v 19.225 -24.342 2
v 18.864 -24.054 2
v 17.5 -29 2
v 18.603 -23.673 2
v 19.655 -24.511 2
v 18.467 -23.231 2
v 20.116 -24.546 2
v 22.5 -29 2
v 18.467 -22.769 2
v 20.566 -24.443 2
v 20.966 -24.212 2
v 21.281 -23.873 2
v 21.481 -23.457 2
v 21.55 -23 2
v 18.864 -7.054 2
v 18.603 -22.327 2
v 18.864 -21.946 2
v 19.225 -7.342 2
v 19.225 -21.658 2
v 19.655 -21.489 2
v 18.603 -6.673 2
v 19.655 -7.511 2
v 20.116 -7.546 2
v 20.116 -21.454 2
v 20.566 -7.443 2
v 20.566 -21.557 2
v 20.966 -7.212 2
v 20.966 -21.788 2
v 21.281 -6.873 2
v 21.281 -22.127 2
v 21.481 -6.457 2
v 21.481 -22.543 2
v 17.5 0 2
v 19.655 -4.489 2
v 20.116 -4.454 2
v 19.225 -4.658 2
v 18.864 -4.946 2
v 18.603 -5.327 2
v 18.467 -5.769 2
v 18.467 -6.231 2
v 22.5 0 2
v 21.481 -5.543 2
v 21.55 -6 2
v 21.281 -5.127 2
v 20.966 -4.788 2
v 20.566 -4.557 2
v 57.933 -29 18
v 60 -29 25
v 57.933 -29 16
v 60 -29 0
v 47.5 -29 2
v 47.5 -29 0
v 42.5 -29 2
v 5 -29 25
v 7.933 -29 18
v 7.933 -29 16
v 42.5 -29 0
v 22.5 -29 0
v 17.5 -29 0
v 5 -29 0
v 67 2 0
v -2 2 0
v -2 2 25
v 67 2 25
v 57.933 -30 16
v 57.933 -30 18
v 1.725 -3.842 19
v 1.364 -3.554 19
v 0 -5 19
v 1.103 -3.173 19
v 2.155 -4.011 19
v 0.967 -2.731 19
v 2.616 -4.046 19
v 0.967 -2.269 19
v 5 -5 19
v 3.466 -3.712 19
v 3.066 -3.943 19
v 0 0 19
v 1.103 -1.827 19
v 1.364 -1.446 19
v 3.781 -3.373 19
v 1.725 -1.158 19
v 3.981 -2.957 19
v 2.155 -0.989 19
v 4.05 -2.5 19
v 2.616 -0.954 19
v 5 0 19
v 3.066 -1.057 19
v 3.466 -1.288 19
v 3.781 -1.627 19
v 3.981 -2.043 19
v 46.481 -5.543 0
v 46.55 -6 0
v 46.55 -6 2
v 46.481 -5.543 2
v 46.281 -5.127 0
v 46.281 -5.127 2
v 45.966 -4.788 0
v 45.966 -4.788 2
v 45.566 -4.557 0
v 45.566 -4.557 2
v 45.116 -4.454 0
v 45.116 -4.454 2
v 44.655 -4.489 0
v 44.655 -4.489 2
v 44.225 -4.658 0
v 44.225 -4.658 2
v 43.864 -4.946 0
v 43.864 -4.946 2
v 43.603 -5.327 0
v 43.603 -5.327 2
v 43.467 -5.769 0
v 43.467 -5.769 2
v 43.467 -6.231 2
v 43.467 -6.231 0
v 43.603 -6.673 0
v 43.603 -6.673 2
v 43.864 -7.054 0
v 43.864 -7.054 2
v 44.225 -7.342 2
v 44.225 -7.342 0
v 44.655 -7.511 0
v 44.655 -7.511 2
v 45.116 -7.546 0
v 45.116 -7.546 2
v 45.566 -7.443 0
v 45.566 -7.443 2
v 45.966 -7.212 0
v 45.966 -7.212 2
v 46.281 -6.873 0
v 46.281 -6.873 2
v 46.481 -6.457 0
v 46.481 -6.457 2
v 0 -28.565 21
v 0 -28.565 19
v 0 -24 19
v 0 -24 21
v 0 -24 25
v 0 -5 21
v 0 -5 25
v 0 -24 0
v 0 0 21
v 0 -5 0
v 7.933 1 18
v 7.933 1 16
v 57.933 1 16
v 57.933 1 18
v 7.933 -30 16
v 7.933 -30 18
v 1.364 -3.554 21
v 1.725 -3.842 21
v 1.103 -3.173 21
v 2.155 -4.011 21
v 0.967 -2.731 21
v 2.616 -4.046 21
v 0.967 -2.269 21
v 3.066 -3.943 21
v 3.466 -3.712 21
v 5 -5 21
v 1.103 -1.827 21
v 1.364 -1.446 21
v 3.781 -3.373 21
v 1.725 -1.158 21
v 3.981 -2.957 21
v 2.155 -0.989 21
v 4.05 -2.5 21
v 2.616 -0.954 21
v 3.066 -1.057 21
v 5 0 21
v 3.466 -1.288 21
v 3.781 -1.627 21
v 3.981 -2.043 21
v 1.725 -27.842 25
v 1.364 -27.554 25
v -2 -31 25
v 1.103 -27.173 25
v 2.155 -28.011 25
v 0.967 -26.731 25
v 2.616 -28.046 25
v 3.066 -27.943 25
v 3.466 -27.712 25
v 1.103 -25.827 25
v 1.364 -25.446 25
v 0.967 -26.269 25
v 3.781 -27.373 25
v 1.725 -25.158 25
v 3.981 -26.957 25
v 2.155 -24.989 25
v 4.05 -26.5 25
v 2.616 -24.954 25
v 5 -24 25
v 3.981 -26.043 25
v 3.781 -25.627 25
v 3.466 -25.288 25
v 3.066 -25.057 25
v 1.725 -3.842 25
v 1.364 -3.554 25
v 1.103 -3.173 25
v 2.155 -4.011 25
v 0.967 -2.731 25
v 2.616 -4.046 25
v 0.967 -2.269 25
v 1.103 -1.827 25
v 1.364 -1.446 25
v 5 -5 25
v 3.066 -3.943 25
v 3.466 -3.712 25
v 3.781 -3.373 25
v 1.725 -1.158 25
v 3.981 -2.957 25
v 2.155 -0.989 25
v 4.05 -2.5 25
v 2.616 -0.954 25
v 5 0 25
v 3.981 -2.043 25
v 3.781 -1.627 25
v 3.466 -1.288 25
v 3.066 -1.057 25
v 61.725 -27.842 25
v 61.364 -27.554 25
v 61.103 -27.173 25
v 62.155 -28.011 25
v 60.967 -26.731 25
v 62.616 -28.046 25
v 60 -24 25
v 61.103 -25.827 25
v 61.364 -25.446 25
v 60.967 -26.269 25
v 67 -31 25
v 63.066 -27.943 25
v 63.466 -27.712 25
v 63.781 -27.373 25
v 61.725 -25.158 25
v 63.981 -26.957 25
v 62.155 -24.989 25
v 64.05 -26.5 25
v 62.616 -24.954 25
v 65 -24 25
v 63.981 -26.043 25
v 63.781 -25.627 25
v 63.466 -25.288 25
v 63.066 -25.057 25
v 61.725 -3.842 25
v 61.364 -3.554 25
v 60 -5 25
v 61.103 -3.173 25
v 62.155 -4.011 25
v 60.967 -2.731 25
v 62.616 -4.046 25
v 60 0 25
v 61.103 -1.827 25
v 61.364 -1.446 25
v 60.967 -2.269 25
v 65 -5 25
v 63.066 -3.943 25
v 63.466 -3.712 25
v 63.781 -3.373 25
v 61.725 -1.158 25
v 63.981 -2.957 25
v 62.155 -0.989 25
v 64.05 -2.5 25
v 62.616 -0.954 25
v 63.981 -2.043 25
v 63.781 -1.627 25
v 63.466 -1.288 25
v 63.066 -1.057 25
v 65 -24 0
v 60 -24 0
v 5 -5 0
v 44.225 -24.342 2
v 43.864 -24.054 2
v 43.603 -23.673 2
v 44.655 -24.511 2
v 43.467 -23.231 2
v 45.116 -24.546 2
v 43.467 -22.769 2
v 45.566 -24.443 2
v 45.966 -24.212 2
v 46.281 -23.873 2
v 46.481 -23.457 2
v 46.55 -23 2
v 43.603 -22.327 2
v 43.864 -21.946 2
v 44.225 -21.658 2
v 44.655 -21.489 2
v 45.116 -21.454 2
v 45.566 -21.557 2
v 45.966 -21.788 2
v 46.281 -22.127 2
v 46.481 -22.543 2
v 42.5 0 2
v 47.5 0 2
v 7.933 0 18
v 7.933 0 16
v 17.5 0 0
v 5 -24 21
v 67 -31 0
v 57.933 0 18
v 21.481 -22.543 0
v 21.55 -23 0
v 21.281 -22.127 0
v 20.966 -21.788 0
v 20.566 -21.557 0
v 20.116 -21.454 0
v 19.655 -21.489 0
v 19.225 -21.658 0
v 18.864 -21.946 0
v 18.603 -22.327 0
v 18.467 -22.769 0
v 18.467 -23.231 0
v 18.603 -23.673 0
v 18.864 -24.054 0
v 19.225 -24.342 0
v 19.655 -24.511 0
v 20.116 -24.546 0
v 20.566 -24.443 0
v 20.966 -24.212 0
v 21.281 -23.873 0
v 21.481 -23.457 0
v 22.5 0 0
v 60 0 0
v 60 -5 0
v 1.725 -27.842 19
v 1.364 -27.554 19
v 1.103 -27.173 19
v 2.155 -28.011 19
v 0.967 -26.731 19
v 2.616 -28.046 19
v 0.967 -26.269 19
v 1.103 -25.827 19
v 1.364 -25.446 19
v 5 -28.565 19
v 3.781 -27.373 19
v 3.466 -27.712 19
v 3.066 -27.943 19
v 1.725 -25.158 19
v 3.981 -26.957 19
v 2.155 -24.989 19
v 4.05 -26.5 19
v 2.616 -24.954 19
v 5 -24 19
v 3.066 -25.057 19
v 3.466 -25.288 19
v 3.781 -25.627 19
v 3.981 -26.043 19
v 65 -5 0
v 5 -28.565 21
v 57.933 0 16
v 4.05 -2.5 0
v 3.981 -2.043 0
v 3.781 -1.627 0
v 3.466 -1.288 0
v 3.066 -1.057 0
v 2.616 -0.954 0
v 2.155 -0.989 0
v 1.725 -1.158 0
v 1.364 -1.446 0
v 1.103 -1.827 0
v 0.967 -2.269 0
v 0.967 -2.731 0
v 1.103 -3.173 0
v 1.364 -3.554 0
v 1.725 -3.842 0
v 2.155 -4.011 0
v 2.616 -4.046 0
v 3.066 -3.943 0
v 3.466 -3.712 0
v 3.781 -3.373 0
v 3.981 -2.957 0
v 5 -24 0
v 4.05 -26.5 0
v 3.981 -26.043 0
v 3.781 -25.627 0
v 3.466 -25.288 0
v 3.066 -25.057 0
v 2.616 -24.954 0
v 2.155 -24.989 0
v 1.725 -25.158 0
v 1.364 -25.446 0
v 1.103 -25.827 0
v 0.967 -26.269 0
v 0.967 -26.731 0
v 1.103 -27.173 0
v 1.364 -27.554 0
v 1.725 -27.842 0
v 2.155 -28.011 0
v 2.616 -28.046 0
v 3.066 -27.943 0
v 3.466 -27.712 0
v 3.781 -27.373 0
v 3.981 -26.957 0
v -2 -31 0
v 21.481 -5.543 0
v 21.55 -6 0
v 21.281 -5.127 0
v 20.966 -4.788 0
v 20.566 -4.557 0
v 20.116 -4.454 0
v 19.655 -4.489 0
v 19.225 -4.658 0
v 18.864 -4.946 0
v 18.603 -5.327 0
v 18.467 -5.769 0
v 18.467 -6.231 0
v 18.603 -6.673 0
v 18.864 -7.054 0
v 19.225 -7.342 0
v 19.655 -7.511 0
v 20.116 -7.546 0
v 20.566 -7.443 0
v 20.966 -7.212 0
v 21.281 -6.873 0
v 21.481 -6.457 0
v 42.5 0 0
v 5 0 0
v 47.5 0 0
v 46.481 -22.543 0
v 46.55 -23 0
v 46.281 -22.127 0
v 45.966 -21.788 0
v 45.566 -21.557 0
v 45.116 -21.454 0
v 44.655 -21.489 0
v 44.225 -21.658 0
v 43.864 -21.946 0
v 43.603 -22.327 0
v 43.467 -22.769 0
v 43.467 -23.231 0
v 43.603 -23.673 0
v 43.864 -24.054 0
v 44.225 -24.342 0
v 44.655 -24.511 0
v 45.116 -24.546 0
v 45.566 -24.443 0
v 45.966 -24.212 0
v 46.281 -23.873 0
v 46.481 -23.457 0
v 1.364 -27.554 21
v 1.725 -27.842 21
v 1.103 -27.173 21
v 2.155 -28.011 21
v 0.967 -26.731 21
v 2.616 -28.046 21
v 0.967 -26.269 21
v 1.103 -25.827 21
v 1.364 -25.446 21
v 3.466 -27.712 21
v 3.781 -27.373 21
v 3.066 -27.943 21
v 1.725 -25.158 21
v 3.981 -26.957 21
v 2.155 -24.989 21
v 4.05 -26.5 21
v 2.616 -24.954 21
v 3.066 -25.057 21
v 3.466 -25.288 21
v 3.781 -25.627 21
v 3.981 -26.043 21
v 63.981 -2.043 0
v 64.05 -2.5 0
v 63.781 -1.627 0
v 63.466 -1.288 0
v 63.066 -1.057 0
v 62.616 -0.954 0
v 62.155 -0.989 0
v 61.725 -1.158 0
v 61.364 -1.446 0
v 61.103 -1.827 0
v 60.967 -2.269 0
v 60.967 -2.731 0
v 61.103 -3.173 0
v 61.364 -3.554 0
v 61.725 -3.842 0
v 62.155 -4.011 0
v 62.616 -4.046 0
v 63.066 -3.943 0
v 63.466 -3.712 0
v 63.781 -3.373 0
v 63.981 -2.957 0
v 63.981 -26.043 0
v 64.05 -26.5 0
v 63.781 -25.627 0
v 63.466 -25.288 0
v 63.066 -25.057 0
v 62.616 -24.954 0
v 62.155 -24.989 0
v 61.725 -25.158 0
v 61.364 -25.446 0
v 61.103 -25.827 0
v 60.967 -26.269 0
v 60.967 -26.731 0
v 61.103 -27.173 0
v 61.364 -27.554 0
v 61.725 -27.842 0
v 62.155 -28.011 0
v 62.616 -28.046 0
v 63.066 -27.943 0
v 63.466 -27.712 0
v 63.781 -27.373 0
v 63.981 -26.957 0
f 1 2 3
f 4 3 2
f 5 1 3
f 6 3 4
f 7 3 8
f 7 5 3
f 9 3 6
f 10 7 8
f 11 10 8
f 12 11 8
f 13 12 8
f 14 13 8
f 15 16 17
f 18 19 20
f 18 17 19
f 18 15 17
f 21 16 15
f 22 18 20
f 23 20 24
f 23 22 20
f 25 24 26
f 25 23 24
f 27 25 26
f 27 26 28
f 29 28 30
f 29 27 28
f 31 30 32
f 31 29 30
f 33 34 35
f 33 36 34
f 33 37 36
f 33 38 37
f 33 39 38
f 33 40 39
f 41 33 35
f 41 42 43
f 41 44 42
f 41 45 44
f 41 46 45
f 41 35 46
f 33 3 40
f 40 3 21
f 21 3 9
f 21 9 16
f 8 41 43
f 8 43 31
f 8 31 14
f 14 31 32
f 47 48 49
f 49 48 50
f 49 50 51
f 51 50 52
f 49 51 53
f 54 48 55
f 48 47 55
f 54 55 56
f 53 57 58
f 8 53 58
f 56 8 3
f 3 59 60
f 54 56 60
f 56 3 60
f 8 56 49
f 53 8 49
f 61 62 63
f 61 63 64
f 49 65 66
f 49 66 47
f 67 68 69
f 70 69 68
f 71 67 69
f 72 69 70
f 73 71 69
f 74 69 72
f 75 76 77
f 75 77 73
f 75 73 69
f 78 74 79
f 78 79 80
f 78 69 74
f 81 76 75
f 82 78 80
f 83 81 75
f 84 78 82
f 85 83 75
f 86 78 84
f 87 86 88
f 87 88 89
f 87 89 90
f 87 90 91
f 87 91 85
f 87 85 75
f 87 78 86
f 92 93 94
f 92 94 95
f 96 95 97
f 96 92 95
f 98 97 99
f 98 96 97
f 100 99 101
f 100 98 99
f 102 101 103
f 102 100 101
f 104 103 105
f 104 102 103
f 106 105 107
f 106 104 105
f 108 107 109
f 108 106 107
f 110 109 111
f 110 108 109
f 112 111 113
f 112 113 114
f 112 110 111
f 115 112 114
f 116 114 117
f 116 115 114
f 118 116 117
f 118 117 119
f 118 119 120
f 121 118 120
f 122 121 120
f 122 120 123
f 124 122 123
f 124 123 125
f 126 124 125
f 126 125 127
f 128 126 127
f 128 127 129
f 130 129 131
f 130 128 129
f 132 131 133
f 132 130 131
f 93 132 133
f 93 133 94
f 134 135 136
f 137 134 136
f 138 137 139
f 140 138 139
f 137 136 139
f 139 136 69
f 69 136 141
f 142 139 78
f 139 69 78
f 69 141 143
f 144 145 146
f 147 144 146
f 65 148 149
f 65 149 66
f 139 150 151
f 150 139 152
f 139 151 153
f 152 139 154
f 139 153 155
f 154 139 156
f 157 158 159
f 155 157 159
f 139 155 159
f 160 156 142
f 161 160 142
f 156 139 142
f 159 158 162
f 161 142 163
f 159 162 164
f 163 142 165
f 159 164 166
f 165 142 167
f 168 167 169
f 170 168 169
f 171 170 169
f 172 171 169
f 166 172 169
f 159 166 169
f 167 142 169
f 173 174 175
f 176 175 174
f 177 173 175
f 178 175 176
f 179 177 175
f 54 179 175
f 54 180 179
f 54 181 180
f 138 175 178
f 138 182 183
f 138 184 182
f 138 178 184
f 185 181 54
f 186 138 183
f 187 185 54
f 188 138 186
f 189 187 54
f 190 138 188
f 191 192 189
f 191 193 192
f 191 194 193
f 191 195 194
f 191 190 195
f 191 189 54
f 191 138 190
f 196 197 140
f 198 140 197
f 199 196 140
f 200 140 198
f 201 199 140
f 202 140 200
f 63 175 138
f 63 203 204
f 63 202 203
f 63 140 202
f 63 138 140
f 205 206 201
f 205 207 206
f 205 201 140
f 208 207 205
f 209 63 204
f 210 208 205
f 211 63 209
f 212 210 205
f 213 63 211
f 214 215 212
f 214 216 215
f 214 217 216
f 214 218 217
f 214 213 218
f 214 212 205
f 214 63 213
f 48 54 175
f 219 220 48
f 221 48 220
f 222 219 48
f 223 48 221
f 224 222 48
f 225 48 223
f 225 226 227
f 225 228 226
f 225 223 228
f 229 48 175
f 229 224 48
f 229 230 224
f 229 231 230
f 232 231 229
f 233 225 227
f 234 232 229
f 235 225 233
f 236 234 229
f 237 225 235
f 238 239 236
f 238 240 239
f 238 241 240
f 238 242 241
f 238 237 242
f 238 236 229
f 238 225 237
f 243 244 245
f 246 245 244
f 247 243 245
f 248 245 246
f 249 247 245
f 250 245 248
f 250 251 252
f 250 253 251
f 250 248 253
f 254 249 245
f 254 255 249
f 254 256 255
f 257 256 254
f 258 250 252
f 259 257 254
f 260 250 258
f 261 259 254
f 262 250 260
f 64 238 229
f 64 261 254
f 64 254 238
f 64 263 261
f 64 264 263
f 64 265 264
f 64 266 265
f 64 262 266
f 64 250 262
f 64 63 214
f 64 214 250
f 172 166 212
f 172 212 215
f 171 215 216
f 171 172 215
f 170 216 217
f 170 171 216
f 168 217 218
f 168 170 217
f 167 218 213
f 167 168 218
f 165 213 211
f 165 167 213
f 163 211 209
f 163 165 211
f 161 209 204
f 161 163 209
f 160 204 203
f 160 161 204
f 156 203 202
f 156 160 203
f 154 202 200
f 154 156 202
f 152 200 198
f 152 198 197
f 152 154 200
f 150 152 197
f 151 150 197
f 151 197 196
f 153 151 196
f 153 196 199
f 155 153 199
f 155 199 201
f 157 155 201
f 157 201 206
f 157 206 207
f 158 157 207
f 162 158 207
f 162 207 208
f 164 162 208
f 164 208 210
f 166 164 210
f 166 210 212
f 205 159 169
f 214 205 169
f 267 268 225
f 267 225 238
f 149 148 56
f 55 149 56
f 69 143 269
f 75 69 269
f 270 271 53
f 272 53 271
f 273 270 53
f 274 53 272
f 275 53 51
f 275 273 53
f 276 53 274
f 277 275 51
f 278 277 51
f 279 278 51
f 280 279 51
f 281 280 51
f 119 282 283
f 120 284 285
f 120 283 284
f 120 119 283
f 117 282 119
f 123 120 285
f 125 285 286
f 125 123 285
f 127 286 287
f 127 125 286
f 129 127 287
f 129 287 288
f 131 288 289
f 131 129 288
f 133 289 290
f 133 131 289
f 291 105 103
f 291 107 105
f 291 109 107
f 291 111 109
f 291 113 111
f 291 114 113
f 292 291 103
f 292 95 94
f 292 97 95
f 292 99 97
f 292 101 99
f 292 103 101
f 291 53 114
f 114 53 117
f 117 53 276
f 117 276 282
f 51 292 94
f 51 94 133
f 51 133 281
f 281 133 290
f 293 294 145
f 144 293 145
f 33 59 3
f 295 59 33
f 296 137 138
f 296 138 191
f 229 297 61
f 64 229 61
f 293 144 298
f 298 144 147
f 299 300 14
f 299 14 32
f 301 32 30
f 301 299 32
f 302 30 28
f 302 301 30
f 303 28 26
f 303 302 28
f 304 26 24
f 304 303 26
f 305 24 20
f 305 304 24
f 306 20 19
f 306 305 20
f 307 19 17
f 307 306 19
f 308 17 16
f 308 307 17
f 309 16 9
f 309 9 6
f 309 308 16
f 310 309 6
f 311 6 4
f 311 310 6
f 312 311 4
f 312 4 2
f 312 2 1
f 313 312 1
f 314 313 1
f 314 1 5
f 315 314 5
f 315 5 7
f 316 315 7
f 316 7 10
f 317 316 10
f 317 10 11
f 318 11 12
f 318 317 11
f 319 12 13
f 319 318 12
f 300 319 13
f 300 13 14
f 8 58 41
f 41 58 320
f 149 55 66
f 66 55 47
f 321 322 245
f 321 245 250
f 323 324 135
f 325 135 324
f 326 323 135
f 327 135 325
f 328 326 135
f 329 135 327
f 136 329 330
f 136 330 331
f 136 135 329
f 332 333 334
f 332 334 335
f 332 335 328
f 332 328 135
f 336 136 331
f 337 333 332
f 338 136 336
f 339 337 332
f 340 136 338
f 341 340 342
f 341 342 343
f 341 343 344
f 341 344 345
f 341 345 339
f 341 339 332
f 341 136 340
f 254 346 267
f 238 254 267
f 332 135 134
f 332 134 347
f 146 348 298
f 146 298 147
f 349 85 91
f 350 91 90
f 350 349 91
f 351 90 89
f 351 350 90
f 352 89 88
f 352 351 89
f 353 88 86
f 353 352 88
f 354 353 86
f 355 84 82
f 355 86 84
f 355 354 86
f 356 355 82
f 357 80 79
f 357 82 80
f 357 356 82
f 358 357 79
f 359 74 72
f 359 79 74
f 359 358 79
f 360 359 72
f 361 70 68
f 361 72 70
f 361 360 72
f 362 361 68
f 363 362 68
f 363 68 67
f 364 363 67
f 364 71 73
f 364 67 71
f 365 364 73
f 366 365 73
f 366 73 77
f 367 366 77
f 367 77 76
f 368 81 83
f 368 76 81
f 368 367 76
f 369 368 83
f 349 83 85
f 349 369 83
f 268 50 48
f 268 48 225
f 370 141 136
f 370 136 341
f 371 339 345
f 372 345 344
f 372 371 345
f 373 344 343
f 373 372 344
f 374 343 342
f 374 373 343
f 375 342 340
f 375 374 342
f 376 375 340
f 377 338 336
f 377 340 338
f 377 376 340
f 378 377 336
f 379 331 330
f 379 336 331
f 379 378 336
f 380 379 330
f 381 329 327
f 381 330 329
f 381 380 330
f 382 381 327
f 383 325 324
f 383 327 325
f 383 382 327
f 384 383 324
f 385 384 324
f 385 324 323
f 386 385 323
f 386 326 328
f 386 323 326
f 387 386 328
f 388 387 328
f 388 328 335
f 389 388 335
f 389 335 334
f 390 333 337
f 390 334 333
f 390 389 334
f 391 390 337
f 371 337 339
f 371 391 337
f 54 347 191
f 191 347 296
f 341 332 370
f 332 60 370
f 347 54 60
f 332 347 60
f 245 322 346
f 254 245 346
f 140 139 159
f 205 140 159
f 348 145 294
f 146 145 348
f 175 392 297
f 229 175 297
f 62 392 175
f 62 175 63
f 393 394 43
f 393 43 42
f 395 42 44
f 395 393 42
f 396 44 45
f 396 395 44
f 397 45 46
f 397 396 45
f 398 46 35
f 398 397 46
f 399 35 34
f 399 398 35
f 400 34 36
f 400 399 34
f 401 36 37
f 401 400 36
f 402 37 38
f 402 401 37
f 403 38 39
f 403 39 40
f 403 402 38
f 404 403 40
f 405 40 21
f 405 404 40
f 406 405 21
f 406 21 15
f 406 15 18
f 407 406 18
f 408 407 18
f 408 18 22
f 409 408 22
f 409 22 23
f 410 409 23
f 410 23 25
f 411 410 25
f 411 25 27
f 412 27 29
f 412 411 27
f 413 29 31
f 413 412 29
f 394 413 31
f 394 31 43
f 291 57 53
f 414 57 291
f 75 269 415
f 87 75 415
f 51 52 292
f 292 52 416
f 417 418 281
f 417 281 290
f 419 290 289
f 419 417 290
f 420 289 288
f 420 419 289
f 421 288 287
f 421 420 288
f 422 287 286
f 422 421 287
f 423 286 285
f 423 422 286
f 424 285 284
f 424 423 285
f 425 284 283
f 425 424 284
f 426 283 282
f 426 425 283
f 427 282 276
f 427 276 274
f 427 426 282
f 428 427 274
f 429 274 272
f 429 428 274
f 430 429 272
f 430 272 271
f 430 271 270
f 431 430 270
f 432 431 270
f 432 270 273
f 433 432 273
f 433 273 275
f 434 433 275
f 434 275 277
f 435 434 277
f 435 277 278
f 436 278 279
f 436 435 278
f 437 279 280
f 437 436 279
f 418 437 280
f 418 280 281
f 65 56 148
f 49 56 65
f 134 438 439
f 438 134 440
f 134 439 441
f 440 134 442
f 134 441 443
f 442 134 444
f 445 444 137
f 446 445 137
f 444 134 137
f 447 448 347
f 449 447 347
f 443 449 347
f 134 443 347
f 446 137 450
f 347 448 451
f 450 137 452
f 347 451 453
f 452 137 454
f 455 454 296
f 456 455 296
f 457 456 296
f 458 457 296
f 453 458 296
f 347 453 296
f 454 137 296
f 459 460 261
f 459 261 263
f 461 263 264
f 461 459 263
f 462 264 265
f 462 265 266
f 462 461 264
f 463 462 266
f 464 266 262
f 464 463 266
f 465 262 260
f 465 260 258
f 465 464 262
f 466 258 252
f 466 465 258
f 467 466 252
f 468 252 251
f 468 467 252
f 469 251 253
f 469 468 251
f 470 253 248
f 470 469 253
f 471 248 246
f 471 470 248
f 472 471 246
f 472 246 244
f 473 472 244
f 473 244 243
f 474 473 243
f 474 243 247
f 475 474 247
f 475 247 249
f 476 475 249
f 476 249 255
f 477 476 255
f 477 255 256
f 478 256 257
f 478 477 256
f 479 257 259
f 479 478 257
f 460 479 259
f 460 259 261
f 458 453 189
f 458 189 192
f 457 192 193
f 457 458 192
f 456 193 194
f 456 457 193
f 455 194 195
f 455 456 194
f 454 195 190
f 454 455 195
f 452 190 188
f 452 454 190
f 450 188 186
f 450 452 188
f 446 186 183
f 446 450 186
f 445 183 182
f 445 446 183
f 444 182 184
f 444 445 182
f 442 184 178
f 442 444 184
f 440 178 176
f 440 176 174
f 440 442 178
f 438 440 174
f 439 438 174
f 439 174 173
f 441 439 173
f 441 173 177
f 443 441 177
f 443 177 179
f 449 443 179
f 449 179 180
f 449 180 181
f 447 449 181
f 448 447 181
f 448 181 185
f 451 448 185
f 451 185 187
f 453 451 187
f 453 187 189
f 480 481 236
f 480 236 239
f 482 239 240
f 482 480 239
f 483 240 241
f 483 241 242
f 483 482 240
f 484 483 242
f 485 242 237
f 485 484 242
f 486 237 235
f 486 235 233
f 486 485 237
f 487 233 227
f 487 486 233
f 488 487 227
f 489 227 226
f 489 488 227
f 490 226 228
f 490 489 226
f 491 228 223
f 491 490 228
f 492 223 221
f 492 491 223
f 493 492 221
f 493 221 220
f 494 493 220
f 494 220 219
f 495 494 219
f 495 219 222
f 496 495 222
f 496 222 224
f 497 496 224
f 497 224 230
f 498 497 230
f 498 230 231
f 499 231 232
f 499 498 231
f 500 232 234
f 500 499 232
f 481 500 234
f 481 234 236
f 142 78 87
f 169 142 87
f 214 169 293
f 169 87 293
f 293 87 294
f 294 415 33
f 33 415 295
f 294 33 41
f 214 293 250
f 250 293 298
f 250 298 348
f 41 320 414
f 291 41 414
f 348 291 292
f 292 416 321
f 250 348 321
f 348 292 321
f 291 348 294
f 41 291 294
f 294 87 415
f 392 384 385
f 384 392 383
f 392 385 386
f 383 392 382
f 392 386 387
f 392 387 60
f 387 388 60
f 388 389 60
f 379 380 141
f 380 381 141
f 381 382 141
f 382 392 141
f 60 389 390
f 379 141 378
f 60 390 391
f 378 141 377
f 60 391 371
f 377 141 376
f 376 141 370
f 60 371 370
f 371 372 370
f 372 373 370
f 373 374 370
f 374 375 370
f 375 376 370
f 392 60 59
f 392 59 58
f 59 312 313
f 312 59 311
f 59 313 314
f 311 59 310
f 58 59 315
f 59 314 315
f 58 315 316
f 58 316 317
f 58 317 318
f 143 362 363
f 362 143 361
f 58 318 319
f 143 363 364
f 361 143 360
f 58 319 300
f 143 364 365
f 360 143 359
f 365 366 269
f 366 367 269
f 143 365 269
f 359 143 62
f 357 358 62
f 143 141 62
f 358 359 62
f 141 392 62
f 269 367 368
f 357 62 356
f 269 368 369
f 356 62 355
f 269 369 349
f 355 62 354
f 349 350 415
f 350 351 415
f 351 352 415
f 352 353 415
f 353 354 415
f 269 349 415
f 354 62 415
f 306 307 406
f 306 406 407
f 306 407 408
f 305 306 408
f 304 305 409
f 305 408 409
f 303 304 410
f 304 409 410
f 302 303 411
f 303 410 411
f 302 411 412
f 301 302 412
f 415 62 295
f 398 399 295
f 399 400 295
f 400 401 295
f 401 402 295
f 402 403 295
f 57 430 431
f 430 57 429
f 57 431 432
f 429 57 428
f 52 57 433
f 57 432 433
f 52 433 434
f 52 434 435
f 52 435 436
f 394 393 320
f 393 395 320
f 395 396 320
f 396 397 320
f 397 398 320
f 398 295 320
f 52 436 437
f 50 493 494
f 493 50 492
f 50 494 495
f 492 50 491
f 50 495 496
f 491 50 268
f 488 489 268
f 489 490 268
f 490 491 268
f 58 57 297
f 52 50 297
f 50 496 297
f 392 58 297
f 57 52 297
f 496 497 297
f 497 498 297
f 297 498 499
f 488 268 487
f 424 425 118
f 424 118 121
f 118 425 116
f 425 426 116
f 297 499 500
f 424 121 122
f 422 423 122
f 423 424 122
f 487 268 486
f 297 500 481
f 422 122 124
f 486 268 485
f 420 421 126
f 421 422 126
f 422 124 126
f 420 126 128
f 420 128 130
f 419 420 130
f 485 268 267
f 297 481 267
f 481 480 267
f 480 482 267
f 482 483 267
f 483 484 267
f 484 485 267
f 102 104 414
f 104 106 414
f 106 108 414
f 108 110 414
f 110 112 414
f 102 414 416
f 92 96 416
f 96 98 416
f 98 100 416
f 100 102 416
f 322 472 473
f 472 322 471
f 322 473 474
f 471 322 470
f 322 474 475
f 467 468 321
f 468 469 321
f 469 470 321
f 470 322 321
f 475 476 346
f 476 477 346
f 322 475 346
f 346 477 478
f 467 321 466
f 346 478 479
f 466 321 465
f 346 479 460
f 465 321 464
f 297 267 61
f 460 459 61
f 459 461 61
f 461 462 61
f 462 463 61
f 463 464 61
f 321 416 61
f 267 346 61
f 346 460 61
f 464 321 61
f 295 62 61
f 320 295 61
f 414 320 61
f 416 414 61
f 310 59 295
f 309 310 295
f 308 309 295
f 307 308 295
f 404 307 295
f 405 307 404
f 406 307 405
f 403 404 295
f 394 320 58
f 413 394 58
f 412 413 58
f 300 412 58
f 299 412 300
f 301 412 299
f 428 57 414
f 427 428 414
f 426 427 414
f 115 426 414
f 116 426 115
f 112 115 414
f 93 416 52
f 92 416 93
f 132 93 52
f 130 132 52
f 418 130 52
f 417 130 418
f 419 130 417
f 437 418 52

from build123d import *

# Parameters (mm, degrees)
F0_W     = 69
F0_H     = 33
F0_W_2   = 5
F0_H_2   = 5
F0_R     = 1.55
F1_DEPTH = 25
F3_W     = 50
F3_H     = 31
F4_DEPTH = 2
F6_W     = 15.3119070455
F6_H     = 28.5653881729
F7_DEPTH = 2
F8_W     = 5
F8_H     = 29.938359429
F8_R     = 1.55
F9_DEPTH = 2


with BuildPart() as f1:
    # F0 (on Top) → F1 (new body)
    with BuildSketch(Plane.XY):
        with Locations((32.5, -14.5)):
            Rectangle(F0_W, F0_H)
        Polygon((0, -5), (0, 0), (5, 0), (60, 0), (65, 0), (65, -5), (65, -24), (65, -29), (60, -29), (5, -29), (0, -29), (0, -24), align=None, mode=Mode.SUBTRACT)
        with Locations((2.5, -2.5)):
            Rectangle(F0_W_2, F0_H_2)
        with Locations((2.5, -2.5)):
            Circle(F0_R, mode=Mode.SUBTRACT)
        with Locations((62.5, -2.5)):
            Rectangle(F0_W_2, F0_H_2)
        with Locations((62.5, -2.5)):
            Circle(F0_R, mode=Mode.SUBTRACT)
        with Locations((62.5, -26.5)):
            Rectangle(F0_W_2, F0_H_2)
        with Locations((62.5, -26.5)):
            Circle(F0_R, mode=Mode.SUBTRACT)
        with Locations((2.5, -26.5)):
            Rectangle(F0_W_2, F0_H_2)
        with Locations((2.5, -26.5)):
            Circle(F0_R, mode=Mode.SUBTRACT)
    extrude(amount=F1_DEPTH)

    # F3 (on offset) → F4 (cut)
    with BuildSketch(Plane.XY.offset(16)):
        with Locations((32.9331636816, -14.5)):
            Rectangle(F3_W, F3_H)
    extrude(amount=F4_DEPTH, mode=Mode.SUBTRACT)

    # F6 (on offset) → F7 (cut)
    with BuildSketch(Plane.XY.offset(19)):
        with Locations((7.6559535228, -14.2826940864)):
            Rectangle(F6_W, F6_H)
    extrude(amount=F7_DEPTH, mode=Mode.SUBTRACT)

    # F8 (on Top) → F9 (join)
    with BuildSketch(Plane.XY):
        with Locations((20, -14.9691797145)):
            Rectangle(F8_W, F8_H)
        with Locations((20, -23)):
            Circle(F8_R, mode=Mode.SUBTRACT)
        with Locations((20, -6)):
            Circle(F8_R, mode=Mode.SUBTRACT)
        with Locations((45, -14.9691797145)):
            Rectangle(F8_W, F8_H)
        with Locations((45, -23)):
            Circle(F8_R, mode=Mode.SUBTRACT)
        with Locations((45, -6)):
            Circle(F8_R, mode=Mode.SUBTRACT)
    extrude(amount=F9_DEPTH)


solid = f1.part
